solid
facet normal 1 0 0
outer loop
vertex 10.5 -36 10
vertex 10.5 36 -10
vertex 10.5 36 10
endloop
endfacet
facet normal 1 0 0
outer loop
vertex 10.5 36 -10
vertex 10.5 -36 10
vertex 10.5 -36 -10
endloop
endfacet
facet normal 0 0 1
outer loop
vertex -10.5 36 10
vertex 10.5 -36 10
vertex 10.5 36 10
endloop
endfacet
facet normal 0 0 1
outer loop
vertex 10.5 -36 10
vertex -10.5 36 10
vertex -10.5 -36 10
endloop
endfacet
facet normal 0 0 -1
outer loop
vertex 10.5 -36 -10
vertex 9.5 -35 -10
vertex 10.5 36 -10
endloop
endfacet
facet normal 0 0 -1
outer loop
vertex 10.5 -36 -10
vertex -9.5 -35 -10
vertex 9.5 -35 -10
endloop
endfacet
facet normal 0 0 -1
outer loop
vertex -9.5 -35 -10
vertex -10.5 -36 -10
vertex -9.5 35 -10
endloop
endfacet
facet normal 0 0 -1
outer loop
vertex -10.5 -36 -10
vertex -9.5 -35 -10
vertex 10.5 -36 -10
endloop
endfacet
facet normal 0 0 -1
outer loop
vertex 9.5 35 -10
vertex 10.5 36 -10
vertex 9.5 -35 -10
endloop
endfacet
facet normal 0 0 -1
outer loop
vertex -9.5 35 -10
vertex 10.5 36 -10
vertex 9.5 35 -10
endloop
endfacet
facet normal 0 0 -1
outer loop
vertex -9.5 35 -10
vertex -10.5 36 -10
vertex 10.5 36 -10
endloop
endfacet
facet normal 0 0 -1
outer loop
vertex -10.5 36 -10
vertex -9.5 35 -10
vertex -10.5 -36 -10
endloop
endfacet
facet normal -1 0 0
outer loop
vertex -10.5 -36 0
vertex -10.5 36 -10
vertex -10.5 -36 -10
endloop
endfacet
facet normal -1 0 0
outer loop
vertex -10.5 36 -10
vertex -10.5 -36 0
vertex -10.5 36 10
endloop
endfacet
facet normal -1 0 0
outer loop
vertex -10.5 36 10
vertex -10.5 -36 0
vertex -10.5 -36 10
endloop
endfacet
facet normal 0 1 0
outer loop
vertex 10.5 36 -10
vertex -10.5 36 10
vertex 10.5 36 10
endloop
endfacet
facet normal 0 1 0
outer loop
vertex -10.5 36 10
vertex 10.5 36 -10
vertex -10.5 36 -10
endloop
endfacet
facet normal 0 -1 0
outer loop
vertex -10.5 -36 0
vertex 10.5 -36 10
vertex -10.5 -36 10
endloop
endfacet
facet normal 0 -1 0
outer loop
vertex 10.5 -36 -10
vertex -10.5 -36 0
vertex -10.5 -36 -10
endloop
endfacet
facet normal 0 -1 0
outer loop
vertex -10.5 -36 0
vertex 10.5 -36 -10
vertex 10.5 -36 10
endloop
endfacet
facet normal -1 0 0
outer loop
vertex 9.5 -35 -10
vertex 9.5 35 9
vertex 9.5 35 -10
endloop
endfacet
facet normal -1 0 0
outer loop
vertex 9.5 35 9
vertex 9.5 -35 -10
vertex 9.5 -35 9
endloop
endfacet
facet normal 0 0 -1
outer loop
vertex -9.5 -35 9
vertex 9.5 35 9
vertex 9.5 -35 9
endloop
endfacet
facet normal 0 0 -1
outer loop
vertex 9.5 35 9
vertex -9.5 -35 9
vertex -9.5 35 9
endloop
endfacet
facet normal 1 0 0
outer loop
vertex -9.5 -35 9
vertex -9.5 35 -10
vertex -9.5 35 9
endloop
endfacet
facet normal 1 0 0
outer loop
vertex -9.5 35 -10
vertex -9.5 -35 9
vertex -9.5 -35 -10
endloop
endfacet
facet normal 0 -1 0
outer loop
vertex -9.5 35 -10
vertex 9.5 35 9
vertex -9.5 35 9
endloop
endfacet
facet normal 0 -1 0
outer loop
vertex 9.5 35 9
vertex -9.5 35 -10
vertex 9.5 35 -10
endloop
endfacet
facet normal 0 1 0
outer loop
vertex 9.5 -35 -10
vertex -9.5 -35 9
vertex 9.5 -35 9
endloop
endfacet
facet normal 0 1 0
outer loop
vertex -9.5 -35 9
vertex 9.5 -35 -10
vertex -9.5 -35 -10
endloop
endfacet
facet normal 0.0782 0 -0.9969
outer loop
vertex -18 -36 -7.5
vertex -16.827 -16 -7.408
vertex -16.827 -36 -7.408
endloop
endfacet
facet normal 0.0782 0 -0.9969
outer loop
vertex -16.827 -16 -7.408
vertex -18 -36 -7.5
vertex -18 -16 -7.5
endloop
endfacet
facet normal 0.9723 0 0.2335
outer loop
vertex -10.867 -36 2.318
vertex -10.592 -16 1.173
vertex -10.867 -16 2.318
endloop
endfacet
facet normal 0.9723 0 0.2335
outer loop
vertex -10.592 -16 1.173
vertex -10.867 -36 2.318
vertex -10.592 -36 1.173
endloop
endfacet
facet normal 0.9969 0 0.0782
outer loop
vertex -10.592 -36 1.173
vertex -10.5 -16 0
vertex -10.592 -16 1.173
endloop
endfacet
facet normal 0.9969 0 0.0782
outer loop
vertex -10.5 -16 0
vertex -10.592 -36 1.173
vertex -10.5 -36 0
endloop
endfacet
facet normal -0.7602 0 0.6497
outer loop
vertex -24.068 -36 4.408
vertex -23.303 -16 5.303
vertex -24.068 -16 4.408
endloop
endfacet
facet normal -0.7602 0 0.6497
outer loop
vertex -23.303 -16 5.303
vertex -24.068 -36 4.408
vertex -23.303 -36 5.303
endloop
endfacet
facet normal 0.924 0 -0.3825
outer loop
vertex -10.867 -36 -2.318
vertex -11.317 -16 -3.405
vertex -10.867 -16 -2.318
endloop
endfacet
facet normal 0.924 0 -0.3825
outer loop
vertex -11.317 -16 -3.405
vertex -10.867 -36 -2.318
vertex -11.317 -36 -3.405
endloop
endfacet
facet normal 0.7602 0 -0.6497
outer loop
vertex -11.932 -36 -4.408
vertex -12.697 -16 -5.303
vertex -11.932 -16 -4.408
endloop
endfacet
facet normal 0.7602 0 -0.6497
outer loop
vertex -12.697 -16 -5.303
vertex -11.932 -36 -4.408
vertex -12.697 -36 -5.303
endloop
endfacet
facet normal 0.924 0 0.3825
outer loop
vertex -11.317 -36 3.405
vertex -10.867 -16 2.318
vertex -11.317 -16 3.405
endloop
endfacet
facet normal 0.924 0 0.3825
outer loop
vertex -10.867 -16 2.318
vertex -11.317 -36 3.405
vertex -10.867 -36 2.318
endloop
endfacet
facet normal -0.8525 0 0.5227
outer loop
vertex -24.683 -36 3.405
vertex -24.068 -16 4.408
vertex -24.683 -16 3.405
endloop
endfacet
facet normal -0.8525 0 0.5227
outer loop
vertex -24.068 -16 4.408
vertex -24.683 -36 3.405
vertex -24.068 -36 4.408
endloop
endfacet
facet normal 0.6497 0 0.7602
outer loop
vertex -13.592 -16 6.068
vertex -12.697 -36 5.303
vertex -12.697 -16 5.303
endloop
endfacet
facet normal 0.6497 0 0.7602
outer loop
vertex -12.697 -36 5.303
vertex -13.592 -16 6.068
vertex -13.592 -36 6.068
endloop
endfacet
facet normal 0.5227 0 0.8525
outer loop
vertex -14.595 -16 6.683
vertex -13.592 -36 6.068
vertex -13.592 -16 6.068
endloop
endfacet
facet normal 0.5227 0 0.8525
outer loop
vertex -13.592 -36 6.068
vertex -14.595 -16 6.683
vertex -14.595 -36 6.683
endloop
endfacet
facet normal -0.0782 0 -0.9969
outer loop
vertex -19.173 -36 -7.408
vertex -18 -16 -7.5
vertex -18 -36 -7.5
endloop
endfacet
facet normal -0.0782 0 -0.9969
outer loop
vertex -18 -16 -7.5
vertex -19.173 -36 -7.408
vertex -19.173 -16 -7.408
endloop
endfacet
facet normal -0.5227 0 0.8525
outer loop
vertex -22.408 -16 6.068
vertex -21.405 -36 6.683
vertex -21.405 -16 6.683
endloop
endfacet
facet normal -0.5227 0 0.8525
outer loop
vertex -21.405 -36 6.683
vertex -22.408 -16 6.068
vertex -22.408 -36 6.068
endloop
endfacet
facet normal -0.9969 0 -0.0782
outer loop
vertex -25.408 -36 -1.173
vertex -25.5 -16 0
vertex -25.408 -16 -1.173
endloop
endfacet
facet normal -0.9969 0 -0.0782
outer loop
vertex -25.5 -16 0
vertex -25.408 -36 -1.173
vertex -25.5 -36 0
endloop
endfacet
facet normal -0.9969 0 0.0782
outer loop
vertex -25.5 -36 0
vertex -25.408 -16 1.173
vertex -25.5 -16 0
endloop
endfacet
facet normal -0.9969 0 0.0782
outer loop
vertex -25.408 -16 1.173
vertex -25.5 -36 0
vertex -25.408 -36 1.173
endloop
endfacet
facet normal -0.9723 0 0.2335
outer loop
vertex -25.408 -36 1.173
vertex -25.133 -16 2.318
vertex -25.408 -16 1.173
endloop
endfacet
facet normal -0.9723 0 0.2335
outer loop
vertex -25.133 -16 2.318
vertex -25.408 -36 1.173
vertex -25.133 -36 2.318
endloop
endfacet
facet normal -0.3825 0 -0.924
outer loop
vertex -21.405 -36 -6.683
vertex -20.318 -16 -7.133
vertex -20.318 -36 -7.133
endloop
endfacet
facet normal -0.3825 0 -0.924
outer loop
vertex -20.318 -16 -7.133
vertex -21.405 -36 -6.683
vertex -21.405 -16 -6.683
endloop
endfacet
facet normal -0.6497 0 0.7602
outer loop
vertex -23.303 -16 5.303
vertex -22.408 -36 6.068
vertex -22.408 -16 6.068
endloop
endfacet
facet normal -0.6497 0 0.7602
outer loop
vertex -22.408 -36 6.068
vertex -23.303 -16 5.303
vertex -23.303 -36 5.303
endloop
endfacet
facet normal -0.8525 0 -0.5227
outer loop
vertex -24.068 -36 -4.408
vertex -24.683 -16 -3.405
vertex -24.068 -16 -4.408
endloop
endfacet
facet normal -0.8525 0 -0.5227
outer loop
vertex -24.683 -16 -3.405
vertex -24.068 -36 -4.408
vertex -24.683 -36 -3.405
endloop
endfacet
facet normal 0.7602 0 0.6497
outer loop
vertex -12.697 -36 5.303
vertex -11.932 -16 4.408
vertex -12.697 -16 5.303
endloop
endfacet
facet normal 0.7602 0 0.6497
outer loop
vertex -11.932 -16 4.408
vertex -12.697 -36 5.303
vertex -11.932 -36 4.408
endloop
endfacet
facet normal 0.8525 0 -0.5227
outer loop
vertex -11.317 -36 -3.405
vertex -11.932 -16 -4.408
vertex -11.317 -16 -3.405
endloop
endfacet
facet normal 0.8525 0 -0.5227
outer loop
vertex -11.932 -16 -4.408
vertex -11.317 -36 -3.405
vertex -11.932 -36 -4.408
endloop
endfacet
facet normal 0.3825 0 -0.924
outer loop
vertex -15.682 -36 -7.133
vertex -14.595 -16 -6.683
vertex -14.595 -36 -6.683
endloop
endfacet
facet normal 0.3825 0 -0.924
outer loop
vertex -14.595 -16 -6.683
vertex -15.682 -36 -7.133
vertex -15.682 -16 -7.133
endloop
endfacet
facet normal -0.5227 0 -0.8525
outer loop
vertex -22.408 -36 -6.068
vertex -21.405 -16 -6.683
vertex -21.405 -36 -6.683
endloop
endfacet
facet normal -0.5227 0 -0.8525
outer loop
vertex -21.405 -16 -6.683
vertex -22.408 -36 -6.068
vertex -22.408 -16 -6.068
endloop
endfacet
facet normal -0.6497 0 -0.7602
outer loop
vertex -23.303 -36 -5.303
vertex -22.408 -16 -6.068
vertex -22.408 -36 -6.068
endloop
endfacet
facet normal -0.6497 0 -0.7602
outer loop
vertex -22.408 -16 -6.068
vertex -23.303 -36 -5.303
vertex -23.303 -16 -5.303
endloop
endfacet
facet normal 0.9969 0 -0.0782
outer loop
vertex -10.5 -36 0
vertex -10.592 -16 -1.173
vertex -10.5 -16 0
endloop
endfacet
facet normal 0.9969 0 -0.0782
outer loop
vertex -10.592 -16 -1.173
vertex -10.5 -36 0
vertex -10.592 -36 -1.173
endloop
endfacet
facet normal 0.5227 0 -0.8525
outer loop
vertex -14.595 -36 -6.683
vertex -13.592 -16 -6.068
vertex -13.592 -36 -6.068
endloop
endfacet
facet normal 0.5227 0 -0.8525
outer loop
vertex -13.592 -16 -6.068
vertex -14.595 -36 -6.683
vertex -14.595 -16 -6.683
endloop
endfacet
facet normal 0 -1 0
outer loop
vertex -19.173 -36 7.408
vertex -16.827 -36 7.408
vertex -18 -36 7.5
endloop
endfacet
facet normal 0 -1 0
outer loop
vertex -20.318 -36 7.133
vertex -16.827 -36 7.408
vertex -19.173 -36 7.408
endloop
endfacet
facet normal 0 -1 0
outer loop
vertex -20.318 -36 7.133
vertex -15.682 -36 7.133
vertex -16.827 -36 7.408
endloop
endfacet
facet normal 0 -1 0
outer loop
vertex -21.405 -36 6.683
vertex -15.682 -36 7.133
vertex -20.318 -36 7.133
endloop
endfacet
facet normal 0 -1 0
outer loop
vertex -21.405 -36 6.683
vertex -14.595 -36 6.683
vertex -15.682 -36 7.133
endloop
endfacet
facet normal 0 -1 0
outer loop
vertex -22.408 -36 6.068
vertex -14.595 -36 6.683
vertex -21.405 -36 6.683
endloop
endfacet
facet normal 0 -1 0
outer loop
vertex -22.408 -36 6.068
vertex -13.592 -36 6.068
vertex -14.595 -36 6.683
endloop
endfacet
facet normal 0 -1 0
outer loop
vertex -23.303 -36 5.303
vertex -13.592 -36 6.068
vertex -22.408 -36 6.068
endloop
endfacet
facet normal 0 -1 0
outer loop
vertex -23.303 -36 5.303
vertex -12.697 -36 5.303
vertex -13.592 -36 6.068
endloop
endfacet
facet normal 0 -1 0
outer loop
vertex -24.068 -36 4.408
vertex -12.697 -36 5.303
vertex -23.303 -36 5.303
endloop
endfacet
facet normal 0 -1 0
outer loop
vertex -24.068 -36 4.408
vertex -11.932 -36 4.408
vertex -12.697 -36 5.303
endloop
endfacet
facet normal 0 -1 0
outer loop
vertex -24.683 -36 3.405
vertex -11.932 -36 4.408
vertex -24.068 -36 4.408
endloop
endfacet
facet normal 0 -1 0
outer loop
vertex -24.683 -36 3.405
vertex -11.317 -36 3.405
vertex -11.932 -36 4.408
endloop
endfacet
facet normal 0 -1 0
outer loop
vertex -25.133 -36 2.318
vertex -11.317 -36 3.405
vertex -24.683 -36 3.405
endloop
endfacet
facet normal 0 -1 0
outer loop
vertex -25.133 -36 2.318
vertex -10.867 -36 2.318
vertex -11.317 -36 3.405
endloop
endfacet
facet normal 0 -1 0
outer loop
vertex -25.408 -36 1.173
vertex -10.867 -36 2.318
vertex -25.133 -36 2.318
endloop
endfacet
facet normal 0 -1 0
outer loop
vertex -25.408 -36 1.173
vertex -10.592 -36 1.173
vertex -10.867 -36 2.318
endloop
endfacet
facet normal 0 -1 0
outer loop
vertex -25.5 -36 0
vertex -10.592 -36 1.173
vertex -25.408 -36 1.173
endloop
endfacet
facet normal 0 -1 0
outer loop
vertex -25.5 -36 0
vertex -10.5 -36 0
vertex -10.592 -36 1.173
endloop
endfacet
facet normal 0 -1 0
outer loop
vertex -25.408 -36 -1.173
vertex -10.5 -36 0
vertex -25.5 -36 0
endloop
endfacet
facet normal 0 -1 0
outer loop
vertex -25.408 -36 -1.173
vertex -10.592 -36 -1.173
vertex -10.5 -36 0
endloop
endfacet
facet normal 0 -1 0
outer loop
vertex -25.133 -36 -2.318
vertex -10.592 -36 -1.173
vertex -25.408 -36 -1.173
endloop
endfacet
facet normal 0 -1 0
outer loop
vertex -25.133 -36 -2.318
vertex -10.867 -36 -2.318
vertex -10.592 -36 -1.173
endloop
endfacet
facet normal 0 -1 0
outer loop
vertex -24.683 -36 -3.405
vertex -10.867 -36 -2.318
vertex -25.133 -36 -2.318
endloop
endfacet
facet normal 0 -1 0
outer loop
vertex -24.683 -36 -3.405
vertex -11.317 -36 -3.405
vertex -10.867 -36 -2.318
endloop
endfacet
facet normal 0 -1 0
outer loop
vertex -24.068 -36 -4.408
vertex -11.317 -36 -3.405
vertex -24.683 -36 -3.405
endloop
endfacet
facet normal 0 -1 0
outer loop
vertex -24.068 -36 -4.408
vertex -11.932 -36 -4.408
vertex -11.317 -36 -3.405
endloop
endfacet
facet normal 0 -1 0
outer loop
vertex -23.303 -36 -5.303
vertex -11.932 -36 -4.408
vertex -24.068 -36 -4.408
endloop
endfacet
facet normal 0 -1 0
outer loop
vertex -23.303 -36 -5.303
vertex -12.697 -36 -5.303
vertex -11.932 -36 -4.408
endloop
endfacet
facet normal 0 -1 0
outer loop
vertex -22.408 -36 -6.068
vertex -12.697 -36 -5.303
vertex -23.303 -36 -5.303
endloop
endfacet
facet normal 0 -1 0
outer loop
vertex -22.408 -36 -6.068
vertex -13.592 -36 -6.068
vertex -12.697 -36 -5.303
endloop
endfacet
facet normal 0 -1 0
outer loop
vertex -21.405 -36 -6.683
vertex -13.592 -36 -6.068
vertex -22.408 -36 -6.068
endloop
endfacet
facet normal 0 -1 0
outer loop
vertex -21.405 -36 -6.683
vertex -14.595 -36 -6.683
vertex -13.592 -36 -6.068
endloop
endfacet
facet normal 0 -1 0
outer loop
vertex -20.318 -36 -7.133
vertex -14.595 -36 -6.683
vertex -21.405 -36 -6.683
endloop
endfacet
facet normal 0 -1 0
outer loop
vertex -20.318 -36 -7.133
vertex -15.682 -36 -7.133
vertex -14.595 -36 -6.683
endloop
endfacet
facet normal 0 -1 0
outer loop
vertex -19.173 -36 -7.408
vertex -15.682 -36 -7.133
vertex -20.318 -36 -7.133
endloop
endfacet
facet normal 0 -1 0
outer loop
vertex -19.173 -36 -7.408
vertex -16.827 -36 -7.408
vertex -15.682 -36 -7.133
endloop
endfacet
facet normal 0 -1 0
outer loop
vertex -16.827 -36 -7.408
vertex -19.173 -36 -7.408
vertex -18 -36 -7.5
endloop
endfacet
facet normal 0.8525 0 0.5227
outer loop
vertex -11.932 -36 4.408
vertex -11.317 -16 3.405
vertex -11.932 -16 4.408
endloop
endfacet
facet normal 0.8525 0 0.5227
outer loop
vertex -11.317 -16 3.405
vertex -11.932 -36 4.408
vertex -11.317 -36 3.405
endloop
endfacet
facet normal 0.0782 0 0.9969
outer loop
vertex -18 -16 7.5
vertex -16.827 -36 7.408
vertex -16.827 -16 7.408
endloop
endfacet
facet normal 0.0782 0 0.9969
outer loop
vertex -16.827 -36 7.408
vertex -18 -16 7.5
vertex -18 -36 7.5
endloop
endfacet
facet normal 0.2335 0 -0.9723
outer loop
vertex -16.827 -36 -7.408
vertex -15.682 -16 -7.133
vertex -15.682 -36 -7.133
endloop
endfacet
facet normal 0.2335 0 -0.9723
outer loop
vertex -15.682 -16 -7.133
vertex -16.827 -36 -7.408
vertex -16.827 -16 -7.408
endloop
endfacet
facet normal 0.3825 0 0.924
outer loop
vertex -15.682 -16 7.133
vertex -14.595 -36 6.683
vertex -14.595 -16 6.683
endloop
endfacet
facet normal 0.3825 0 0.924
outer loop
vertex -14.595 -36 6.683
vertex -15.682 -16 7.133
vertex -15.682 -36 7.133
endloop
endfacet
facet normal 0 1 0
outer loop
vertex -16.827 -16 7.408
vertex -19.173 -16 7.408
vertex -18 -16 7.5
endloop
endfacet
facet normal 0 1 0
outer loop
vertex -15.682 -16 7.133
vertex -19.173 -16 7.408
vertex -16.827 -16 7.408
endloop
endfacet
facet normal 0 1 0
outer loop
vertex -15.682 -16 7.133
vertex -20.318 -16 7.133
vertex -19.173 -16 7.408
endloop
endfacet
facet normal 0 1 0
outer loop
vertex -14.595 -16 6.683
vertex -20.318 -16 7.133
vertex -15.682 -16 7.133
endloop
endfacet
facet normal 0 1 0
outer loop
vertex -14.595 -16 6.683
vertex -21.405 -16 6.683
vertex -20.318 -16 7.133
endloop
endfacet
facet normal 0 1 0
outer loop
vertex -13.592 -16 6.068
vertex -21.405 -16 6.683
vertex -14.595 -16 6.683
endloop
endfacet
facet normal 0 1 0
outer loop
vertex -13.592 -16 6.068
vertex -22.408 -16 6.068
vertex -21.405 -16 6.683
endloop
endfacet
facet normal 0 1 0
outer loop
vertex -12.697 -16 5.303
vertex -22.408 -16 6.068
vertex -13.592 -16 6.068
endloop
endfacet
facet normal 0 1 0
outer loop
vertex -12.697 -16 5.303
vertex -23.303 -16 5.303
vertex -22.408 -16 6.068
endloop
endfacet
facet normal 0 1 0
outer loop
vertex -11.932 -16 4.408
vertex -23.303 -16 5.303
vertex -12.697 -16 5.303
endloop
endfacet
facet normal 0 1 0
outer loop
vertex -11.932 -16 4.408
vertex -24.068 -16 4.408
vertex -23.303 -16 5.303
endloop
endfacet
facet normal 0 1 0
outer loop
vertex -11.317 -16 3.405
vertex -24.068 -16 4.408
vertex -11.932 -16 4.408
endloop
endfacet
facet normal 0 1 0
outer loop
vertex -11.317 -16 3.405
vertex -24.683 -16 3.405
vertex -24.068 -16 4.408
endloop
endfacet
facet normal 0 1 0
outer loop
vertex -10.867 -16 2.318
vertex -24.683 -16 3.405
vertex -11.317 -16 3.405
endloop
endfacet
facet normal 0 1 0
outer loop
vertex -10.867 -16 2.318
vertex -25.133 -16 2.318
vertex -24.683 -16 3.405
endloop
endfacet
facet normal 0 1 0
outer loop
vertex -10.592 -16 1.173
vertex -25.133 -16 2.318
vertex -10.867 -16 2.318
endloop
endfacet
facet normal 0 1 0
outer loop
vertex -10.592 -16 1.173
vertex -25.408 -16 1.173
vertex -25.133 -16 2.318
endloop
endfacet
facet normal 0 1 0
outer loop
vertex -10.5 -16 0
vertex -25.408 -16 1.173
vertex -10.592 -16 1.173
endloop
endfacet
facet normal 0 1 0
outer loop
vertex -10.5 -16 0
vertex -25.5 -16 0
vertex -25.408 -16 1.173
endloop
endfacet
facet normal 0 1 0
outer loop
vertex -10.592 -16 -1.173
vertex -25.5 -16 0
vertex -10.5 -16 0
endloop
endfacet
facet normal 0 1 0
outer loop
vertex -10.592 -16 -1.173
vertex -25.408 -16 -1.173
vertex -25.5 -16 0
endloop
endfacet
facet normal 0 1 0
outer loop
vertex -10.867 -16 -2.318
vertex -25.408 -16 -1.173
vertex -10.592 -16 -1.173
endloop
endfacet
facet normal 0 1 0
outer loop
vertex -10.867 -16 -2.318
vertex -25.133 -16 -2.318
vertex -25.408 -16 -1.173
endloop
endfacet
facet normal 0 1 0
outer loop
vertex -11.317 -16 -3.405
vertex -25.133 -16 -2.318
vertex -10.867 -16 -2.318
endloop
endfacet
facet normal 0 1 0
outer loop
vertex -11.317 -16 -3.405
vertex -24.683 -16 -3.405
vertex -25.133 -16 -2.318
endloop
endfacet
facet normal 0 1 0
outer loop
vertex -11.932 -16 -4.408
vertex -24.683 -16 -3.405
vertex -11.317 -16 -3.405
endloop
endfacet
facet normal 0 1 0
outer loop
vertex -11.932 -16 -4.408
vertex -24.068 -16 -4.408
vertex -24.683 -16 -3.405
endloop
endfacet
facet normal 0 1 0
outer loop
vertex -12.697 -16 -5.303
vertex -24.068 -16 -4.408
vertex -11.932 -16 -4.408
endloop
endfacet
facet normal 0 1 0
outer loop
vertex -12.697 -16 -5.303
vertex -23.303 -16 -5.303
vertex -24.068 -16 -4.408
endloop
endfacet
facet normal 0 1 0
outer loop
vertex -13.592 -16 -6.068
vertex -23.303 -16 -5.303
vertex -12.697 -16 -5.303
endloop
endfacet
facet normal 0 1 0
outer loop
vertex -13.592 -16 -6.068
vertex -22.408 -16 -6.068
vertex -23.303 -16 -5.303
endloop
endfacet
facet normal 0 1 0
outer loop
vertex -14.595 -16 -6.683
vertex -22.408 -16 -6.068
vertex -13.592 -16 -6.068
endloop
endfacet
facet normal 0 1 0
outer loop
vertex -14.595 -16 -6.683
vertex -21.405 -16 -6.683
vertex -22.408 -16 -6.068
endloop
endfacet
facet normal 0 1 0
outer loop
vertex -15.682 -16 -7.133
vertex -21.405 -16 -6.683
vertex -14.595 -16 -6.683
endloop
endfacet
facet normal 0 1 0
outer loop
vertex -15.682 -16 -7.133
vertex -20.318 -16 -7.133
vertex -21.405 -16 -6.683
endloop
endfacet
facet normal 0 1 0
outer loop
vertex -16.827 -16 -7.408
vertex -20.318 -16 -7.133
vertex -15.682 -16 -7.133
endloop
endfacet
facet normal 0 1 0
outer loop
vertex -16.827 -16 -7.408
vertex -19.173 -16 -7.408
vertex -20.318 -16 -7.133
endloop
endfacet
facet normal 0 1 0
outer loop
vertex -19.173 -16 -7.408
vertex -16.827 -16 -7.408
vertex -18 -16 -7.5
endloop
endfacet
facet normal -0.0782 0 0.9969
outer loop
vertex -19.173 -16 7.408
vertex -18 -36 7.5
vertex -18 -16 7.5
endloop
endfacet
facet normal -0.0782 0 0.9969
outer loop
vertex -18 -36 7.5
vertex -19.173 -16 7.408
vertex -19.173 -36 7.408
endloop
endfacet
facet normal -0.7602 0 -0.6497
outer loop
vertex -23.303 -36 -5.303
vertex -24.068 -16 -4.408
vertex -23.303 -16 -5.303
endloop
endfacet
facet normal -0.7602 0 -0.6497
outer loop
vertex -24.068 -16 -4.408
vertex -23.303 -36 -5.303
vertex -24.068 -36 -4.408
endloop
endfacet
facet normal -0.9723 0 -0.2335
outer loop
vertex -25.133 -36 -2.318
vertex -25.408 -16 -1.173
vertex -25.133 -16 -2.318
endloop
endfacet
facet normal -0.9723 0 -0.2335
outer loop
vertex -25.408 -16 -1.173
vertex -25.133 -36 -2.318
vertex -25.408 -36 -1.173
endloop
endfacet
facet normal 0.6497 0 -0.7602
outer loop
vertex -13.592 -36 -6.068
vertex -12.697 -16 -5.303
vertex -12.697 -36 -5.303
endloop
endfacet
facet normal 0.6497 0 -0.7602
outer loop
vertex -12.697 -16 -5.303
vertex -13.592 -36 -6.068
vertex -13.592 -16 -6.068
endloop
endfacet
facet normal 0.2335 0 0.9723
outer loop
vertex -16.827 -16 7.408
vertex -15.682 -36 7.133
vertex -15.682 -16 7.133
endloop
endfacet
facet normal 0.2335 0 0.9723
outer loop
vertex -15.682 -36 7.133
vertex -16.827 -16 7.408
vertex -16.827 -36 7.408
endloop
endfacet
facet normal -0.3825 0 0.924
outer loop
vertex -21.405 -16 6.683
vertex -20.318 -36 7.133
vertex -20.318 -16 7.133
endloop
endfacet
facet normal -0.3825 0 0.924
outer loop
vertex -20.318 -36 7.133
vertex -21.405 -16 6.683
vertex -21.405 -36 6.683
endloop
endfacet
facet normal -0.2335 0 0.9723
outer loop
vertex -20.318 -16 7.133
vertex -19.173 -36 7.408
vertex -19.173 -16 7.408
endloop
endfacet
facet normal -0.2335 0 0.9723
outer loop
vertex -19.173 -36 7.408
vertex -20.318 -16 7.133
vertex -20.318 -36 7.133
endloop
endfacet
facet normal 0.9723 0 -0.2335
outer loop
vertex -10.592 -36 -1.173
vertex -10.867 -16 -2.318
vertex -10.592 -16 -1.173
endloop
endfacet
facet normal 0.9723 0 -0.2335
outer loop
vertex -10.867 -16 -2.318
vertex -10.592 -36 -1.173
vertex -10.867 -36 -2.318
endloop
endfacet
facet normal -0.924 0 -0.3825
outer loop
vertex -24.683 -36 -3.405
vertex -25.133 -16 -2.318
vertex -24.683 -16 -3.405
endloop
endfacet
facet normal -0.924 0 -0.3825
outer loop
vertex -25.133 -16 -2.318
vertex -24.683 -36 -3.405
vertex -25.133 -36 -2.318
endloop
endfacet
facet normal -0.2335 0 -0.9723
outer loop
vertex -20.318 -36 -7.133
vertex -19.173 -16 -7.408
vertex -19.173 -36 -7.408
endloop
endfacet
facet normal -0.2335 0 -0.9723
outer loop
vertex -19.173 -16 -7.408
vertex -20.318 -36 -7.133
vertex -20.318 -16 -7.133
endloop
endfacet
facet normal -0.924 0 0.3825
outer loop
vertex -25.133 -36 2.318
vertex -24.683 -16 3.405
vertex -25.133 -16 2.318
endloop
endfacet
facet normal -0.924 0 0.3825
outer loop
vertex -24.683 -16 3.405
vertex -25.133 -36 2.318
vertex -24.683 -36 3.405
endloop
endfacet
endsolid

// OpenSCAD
$fn=40;
difference(){
    cube([21,72,20], center=true);
    translate([0,0,-1])cube([19,70,20], center=true);
}

translate([-18,-16,0])rotate([90,0,0])cylinder(d=15,h=20);
